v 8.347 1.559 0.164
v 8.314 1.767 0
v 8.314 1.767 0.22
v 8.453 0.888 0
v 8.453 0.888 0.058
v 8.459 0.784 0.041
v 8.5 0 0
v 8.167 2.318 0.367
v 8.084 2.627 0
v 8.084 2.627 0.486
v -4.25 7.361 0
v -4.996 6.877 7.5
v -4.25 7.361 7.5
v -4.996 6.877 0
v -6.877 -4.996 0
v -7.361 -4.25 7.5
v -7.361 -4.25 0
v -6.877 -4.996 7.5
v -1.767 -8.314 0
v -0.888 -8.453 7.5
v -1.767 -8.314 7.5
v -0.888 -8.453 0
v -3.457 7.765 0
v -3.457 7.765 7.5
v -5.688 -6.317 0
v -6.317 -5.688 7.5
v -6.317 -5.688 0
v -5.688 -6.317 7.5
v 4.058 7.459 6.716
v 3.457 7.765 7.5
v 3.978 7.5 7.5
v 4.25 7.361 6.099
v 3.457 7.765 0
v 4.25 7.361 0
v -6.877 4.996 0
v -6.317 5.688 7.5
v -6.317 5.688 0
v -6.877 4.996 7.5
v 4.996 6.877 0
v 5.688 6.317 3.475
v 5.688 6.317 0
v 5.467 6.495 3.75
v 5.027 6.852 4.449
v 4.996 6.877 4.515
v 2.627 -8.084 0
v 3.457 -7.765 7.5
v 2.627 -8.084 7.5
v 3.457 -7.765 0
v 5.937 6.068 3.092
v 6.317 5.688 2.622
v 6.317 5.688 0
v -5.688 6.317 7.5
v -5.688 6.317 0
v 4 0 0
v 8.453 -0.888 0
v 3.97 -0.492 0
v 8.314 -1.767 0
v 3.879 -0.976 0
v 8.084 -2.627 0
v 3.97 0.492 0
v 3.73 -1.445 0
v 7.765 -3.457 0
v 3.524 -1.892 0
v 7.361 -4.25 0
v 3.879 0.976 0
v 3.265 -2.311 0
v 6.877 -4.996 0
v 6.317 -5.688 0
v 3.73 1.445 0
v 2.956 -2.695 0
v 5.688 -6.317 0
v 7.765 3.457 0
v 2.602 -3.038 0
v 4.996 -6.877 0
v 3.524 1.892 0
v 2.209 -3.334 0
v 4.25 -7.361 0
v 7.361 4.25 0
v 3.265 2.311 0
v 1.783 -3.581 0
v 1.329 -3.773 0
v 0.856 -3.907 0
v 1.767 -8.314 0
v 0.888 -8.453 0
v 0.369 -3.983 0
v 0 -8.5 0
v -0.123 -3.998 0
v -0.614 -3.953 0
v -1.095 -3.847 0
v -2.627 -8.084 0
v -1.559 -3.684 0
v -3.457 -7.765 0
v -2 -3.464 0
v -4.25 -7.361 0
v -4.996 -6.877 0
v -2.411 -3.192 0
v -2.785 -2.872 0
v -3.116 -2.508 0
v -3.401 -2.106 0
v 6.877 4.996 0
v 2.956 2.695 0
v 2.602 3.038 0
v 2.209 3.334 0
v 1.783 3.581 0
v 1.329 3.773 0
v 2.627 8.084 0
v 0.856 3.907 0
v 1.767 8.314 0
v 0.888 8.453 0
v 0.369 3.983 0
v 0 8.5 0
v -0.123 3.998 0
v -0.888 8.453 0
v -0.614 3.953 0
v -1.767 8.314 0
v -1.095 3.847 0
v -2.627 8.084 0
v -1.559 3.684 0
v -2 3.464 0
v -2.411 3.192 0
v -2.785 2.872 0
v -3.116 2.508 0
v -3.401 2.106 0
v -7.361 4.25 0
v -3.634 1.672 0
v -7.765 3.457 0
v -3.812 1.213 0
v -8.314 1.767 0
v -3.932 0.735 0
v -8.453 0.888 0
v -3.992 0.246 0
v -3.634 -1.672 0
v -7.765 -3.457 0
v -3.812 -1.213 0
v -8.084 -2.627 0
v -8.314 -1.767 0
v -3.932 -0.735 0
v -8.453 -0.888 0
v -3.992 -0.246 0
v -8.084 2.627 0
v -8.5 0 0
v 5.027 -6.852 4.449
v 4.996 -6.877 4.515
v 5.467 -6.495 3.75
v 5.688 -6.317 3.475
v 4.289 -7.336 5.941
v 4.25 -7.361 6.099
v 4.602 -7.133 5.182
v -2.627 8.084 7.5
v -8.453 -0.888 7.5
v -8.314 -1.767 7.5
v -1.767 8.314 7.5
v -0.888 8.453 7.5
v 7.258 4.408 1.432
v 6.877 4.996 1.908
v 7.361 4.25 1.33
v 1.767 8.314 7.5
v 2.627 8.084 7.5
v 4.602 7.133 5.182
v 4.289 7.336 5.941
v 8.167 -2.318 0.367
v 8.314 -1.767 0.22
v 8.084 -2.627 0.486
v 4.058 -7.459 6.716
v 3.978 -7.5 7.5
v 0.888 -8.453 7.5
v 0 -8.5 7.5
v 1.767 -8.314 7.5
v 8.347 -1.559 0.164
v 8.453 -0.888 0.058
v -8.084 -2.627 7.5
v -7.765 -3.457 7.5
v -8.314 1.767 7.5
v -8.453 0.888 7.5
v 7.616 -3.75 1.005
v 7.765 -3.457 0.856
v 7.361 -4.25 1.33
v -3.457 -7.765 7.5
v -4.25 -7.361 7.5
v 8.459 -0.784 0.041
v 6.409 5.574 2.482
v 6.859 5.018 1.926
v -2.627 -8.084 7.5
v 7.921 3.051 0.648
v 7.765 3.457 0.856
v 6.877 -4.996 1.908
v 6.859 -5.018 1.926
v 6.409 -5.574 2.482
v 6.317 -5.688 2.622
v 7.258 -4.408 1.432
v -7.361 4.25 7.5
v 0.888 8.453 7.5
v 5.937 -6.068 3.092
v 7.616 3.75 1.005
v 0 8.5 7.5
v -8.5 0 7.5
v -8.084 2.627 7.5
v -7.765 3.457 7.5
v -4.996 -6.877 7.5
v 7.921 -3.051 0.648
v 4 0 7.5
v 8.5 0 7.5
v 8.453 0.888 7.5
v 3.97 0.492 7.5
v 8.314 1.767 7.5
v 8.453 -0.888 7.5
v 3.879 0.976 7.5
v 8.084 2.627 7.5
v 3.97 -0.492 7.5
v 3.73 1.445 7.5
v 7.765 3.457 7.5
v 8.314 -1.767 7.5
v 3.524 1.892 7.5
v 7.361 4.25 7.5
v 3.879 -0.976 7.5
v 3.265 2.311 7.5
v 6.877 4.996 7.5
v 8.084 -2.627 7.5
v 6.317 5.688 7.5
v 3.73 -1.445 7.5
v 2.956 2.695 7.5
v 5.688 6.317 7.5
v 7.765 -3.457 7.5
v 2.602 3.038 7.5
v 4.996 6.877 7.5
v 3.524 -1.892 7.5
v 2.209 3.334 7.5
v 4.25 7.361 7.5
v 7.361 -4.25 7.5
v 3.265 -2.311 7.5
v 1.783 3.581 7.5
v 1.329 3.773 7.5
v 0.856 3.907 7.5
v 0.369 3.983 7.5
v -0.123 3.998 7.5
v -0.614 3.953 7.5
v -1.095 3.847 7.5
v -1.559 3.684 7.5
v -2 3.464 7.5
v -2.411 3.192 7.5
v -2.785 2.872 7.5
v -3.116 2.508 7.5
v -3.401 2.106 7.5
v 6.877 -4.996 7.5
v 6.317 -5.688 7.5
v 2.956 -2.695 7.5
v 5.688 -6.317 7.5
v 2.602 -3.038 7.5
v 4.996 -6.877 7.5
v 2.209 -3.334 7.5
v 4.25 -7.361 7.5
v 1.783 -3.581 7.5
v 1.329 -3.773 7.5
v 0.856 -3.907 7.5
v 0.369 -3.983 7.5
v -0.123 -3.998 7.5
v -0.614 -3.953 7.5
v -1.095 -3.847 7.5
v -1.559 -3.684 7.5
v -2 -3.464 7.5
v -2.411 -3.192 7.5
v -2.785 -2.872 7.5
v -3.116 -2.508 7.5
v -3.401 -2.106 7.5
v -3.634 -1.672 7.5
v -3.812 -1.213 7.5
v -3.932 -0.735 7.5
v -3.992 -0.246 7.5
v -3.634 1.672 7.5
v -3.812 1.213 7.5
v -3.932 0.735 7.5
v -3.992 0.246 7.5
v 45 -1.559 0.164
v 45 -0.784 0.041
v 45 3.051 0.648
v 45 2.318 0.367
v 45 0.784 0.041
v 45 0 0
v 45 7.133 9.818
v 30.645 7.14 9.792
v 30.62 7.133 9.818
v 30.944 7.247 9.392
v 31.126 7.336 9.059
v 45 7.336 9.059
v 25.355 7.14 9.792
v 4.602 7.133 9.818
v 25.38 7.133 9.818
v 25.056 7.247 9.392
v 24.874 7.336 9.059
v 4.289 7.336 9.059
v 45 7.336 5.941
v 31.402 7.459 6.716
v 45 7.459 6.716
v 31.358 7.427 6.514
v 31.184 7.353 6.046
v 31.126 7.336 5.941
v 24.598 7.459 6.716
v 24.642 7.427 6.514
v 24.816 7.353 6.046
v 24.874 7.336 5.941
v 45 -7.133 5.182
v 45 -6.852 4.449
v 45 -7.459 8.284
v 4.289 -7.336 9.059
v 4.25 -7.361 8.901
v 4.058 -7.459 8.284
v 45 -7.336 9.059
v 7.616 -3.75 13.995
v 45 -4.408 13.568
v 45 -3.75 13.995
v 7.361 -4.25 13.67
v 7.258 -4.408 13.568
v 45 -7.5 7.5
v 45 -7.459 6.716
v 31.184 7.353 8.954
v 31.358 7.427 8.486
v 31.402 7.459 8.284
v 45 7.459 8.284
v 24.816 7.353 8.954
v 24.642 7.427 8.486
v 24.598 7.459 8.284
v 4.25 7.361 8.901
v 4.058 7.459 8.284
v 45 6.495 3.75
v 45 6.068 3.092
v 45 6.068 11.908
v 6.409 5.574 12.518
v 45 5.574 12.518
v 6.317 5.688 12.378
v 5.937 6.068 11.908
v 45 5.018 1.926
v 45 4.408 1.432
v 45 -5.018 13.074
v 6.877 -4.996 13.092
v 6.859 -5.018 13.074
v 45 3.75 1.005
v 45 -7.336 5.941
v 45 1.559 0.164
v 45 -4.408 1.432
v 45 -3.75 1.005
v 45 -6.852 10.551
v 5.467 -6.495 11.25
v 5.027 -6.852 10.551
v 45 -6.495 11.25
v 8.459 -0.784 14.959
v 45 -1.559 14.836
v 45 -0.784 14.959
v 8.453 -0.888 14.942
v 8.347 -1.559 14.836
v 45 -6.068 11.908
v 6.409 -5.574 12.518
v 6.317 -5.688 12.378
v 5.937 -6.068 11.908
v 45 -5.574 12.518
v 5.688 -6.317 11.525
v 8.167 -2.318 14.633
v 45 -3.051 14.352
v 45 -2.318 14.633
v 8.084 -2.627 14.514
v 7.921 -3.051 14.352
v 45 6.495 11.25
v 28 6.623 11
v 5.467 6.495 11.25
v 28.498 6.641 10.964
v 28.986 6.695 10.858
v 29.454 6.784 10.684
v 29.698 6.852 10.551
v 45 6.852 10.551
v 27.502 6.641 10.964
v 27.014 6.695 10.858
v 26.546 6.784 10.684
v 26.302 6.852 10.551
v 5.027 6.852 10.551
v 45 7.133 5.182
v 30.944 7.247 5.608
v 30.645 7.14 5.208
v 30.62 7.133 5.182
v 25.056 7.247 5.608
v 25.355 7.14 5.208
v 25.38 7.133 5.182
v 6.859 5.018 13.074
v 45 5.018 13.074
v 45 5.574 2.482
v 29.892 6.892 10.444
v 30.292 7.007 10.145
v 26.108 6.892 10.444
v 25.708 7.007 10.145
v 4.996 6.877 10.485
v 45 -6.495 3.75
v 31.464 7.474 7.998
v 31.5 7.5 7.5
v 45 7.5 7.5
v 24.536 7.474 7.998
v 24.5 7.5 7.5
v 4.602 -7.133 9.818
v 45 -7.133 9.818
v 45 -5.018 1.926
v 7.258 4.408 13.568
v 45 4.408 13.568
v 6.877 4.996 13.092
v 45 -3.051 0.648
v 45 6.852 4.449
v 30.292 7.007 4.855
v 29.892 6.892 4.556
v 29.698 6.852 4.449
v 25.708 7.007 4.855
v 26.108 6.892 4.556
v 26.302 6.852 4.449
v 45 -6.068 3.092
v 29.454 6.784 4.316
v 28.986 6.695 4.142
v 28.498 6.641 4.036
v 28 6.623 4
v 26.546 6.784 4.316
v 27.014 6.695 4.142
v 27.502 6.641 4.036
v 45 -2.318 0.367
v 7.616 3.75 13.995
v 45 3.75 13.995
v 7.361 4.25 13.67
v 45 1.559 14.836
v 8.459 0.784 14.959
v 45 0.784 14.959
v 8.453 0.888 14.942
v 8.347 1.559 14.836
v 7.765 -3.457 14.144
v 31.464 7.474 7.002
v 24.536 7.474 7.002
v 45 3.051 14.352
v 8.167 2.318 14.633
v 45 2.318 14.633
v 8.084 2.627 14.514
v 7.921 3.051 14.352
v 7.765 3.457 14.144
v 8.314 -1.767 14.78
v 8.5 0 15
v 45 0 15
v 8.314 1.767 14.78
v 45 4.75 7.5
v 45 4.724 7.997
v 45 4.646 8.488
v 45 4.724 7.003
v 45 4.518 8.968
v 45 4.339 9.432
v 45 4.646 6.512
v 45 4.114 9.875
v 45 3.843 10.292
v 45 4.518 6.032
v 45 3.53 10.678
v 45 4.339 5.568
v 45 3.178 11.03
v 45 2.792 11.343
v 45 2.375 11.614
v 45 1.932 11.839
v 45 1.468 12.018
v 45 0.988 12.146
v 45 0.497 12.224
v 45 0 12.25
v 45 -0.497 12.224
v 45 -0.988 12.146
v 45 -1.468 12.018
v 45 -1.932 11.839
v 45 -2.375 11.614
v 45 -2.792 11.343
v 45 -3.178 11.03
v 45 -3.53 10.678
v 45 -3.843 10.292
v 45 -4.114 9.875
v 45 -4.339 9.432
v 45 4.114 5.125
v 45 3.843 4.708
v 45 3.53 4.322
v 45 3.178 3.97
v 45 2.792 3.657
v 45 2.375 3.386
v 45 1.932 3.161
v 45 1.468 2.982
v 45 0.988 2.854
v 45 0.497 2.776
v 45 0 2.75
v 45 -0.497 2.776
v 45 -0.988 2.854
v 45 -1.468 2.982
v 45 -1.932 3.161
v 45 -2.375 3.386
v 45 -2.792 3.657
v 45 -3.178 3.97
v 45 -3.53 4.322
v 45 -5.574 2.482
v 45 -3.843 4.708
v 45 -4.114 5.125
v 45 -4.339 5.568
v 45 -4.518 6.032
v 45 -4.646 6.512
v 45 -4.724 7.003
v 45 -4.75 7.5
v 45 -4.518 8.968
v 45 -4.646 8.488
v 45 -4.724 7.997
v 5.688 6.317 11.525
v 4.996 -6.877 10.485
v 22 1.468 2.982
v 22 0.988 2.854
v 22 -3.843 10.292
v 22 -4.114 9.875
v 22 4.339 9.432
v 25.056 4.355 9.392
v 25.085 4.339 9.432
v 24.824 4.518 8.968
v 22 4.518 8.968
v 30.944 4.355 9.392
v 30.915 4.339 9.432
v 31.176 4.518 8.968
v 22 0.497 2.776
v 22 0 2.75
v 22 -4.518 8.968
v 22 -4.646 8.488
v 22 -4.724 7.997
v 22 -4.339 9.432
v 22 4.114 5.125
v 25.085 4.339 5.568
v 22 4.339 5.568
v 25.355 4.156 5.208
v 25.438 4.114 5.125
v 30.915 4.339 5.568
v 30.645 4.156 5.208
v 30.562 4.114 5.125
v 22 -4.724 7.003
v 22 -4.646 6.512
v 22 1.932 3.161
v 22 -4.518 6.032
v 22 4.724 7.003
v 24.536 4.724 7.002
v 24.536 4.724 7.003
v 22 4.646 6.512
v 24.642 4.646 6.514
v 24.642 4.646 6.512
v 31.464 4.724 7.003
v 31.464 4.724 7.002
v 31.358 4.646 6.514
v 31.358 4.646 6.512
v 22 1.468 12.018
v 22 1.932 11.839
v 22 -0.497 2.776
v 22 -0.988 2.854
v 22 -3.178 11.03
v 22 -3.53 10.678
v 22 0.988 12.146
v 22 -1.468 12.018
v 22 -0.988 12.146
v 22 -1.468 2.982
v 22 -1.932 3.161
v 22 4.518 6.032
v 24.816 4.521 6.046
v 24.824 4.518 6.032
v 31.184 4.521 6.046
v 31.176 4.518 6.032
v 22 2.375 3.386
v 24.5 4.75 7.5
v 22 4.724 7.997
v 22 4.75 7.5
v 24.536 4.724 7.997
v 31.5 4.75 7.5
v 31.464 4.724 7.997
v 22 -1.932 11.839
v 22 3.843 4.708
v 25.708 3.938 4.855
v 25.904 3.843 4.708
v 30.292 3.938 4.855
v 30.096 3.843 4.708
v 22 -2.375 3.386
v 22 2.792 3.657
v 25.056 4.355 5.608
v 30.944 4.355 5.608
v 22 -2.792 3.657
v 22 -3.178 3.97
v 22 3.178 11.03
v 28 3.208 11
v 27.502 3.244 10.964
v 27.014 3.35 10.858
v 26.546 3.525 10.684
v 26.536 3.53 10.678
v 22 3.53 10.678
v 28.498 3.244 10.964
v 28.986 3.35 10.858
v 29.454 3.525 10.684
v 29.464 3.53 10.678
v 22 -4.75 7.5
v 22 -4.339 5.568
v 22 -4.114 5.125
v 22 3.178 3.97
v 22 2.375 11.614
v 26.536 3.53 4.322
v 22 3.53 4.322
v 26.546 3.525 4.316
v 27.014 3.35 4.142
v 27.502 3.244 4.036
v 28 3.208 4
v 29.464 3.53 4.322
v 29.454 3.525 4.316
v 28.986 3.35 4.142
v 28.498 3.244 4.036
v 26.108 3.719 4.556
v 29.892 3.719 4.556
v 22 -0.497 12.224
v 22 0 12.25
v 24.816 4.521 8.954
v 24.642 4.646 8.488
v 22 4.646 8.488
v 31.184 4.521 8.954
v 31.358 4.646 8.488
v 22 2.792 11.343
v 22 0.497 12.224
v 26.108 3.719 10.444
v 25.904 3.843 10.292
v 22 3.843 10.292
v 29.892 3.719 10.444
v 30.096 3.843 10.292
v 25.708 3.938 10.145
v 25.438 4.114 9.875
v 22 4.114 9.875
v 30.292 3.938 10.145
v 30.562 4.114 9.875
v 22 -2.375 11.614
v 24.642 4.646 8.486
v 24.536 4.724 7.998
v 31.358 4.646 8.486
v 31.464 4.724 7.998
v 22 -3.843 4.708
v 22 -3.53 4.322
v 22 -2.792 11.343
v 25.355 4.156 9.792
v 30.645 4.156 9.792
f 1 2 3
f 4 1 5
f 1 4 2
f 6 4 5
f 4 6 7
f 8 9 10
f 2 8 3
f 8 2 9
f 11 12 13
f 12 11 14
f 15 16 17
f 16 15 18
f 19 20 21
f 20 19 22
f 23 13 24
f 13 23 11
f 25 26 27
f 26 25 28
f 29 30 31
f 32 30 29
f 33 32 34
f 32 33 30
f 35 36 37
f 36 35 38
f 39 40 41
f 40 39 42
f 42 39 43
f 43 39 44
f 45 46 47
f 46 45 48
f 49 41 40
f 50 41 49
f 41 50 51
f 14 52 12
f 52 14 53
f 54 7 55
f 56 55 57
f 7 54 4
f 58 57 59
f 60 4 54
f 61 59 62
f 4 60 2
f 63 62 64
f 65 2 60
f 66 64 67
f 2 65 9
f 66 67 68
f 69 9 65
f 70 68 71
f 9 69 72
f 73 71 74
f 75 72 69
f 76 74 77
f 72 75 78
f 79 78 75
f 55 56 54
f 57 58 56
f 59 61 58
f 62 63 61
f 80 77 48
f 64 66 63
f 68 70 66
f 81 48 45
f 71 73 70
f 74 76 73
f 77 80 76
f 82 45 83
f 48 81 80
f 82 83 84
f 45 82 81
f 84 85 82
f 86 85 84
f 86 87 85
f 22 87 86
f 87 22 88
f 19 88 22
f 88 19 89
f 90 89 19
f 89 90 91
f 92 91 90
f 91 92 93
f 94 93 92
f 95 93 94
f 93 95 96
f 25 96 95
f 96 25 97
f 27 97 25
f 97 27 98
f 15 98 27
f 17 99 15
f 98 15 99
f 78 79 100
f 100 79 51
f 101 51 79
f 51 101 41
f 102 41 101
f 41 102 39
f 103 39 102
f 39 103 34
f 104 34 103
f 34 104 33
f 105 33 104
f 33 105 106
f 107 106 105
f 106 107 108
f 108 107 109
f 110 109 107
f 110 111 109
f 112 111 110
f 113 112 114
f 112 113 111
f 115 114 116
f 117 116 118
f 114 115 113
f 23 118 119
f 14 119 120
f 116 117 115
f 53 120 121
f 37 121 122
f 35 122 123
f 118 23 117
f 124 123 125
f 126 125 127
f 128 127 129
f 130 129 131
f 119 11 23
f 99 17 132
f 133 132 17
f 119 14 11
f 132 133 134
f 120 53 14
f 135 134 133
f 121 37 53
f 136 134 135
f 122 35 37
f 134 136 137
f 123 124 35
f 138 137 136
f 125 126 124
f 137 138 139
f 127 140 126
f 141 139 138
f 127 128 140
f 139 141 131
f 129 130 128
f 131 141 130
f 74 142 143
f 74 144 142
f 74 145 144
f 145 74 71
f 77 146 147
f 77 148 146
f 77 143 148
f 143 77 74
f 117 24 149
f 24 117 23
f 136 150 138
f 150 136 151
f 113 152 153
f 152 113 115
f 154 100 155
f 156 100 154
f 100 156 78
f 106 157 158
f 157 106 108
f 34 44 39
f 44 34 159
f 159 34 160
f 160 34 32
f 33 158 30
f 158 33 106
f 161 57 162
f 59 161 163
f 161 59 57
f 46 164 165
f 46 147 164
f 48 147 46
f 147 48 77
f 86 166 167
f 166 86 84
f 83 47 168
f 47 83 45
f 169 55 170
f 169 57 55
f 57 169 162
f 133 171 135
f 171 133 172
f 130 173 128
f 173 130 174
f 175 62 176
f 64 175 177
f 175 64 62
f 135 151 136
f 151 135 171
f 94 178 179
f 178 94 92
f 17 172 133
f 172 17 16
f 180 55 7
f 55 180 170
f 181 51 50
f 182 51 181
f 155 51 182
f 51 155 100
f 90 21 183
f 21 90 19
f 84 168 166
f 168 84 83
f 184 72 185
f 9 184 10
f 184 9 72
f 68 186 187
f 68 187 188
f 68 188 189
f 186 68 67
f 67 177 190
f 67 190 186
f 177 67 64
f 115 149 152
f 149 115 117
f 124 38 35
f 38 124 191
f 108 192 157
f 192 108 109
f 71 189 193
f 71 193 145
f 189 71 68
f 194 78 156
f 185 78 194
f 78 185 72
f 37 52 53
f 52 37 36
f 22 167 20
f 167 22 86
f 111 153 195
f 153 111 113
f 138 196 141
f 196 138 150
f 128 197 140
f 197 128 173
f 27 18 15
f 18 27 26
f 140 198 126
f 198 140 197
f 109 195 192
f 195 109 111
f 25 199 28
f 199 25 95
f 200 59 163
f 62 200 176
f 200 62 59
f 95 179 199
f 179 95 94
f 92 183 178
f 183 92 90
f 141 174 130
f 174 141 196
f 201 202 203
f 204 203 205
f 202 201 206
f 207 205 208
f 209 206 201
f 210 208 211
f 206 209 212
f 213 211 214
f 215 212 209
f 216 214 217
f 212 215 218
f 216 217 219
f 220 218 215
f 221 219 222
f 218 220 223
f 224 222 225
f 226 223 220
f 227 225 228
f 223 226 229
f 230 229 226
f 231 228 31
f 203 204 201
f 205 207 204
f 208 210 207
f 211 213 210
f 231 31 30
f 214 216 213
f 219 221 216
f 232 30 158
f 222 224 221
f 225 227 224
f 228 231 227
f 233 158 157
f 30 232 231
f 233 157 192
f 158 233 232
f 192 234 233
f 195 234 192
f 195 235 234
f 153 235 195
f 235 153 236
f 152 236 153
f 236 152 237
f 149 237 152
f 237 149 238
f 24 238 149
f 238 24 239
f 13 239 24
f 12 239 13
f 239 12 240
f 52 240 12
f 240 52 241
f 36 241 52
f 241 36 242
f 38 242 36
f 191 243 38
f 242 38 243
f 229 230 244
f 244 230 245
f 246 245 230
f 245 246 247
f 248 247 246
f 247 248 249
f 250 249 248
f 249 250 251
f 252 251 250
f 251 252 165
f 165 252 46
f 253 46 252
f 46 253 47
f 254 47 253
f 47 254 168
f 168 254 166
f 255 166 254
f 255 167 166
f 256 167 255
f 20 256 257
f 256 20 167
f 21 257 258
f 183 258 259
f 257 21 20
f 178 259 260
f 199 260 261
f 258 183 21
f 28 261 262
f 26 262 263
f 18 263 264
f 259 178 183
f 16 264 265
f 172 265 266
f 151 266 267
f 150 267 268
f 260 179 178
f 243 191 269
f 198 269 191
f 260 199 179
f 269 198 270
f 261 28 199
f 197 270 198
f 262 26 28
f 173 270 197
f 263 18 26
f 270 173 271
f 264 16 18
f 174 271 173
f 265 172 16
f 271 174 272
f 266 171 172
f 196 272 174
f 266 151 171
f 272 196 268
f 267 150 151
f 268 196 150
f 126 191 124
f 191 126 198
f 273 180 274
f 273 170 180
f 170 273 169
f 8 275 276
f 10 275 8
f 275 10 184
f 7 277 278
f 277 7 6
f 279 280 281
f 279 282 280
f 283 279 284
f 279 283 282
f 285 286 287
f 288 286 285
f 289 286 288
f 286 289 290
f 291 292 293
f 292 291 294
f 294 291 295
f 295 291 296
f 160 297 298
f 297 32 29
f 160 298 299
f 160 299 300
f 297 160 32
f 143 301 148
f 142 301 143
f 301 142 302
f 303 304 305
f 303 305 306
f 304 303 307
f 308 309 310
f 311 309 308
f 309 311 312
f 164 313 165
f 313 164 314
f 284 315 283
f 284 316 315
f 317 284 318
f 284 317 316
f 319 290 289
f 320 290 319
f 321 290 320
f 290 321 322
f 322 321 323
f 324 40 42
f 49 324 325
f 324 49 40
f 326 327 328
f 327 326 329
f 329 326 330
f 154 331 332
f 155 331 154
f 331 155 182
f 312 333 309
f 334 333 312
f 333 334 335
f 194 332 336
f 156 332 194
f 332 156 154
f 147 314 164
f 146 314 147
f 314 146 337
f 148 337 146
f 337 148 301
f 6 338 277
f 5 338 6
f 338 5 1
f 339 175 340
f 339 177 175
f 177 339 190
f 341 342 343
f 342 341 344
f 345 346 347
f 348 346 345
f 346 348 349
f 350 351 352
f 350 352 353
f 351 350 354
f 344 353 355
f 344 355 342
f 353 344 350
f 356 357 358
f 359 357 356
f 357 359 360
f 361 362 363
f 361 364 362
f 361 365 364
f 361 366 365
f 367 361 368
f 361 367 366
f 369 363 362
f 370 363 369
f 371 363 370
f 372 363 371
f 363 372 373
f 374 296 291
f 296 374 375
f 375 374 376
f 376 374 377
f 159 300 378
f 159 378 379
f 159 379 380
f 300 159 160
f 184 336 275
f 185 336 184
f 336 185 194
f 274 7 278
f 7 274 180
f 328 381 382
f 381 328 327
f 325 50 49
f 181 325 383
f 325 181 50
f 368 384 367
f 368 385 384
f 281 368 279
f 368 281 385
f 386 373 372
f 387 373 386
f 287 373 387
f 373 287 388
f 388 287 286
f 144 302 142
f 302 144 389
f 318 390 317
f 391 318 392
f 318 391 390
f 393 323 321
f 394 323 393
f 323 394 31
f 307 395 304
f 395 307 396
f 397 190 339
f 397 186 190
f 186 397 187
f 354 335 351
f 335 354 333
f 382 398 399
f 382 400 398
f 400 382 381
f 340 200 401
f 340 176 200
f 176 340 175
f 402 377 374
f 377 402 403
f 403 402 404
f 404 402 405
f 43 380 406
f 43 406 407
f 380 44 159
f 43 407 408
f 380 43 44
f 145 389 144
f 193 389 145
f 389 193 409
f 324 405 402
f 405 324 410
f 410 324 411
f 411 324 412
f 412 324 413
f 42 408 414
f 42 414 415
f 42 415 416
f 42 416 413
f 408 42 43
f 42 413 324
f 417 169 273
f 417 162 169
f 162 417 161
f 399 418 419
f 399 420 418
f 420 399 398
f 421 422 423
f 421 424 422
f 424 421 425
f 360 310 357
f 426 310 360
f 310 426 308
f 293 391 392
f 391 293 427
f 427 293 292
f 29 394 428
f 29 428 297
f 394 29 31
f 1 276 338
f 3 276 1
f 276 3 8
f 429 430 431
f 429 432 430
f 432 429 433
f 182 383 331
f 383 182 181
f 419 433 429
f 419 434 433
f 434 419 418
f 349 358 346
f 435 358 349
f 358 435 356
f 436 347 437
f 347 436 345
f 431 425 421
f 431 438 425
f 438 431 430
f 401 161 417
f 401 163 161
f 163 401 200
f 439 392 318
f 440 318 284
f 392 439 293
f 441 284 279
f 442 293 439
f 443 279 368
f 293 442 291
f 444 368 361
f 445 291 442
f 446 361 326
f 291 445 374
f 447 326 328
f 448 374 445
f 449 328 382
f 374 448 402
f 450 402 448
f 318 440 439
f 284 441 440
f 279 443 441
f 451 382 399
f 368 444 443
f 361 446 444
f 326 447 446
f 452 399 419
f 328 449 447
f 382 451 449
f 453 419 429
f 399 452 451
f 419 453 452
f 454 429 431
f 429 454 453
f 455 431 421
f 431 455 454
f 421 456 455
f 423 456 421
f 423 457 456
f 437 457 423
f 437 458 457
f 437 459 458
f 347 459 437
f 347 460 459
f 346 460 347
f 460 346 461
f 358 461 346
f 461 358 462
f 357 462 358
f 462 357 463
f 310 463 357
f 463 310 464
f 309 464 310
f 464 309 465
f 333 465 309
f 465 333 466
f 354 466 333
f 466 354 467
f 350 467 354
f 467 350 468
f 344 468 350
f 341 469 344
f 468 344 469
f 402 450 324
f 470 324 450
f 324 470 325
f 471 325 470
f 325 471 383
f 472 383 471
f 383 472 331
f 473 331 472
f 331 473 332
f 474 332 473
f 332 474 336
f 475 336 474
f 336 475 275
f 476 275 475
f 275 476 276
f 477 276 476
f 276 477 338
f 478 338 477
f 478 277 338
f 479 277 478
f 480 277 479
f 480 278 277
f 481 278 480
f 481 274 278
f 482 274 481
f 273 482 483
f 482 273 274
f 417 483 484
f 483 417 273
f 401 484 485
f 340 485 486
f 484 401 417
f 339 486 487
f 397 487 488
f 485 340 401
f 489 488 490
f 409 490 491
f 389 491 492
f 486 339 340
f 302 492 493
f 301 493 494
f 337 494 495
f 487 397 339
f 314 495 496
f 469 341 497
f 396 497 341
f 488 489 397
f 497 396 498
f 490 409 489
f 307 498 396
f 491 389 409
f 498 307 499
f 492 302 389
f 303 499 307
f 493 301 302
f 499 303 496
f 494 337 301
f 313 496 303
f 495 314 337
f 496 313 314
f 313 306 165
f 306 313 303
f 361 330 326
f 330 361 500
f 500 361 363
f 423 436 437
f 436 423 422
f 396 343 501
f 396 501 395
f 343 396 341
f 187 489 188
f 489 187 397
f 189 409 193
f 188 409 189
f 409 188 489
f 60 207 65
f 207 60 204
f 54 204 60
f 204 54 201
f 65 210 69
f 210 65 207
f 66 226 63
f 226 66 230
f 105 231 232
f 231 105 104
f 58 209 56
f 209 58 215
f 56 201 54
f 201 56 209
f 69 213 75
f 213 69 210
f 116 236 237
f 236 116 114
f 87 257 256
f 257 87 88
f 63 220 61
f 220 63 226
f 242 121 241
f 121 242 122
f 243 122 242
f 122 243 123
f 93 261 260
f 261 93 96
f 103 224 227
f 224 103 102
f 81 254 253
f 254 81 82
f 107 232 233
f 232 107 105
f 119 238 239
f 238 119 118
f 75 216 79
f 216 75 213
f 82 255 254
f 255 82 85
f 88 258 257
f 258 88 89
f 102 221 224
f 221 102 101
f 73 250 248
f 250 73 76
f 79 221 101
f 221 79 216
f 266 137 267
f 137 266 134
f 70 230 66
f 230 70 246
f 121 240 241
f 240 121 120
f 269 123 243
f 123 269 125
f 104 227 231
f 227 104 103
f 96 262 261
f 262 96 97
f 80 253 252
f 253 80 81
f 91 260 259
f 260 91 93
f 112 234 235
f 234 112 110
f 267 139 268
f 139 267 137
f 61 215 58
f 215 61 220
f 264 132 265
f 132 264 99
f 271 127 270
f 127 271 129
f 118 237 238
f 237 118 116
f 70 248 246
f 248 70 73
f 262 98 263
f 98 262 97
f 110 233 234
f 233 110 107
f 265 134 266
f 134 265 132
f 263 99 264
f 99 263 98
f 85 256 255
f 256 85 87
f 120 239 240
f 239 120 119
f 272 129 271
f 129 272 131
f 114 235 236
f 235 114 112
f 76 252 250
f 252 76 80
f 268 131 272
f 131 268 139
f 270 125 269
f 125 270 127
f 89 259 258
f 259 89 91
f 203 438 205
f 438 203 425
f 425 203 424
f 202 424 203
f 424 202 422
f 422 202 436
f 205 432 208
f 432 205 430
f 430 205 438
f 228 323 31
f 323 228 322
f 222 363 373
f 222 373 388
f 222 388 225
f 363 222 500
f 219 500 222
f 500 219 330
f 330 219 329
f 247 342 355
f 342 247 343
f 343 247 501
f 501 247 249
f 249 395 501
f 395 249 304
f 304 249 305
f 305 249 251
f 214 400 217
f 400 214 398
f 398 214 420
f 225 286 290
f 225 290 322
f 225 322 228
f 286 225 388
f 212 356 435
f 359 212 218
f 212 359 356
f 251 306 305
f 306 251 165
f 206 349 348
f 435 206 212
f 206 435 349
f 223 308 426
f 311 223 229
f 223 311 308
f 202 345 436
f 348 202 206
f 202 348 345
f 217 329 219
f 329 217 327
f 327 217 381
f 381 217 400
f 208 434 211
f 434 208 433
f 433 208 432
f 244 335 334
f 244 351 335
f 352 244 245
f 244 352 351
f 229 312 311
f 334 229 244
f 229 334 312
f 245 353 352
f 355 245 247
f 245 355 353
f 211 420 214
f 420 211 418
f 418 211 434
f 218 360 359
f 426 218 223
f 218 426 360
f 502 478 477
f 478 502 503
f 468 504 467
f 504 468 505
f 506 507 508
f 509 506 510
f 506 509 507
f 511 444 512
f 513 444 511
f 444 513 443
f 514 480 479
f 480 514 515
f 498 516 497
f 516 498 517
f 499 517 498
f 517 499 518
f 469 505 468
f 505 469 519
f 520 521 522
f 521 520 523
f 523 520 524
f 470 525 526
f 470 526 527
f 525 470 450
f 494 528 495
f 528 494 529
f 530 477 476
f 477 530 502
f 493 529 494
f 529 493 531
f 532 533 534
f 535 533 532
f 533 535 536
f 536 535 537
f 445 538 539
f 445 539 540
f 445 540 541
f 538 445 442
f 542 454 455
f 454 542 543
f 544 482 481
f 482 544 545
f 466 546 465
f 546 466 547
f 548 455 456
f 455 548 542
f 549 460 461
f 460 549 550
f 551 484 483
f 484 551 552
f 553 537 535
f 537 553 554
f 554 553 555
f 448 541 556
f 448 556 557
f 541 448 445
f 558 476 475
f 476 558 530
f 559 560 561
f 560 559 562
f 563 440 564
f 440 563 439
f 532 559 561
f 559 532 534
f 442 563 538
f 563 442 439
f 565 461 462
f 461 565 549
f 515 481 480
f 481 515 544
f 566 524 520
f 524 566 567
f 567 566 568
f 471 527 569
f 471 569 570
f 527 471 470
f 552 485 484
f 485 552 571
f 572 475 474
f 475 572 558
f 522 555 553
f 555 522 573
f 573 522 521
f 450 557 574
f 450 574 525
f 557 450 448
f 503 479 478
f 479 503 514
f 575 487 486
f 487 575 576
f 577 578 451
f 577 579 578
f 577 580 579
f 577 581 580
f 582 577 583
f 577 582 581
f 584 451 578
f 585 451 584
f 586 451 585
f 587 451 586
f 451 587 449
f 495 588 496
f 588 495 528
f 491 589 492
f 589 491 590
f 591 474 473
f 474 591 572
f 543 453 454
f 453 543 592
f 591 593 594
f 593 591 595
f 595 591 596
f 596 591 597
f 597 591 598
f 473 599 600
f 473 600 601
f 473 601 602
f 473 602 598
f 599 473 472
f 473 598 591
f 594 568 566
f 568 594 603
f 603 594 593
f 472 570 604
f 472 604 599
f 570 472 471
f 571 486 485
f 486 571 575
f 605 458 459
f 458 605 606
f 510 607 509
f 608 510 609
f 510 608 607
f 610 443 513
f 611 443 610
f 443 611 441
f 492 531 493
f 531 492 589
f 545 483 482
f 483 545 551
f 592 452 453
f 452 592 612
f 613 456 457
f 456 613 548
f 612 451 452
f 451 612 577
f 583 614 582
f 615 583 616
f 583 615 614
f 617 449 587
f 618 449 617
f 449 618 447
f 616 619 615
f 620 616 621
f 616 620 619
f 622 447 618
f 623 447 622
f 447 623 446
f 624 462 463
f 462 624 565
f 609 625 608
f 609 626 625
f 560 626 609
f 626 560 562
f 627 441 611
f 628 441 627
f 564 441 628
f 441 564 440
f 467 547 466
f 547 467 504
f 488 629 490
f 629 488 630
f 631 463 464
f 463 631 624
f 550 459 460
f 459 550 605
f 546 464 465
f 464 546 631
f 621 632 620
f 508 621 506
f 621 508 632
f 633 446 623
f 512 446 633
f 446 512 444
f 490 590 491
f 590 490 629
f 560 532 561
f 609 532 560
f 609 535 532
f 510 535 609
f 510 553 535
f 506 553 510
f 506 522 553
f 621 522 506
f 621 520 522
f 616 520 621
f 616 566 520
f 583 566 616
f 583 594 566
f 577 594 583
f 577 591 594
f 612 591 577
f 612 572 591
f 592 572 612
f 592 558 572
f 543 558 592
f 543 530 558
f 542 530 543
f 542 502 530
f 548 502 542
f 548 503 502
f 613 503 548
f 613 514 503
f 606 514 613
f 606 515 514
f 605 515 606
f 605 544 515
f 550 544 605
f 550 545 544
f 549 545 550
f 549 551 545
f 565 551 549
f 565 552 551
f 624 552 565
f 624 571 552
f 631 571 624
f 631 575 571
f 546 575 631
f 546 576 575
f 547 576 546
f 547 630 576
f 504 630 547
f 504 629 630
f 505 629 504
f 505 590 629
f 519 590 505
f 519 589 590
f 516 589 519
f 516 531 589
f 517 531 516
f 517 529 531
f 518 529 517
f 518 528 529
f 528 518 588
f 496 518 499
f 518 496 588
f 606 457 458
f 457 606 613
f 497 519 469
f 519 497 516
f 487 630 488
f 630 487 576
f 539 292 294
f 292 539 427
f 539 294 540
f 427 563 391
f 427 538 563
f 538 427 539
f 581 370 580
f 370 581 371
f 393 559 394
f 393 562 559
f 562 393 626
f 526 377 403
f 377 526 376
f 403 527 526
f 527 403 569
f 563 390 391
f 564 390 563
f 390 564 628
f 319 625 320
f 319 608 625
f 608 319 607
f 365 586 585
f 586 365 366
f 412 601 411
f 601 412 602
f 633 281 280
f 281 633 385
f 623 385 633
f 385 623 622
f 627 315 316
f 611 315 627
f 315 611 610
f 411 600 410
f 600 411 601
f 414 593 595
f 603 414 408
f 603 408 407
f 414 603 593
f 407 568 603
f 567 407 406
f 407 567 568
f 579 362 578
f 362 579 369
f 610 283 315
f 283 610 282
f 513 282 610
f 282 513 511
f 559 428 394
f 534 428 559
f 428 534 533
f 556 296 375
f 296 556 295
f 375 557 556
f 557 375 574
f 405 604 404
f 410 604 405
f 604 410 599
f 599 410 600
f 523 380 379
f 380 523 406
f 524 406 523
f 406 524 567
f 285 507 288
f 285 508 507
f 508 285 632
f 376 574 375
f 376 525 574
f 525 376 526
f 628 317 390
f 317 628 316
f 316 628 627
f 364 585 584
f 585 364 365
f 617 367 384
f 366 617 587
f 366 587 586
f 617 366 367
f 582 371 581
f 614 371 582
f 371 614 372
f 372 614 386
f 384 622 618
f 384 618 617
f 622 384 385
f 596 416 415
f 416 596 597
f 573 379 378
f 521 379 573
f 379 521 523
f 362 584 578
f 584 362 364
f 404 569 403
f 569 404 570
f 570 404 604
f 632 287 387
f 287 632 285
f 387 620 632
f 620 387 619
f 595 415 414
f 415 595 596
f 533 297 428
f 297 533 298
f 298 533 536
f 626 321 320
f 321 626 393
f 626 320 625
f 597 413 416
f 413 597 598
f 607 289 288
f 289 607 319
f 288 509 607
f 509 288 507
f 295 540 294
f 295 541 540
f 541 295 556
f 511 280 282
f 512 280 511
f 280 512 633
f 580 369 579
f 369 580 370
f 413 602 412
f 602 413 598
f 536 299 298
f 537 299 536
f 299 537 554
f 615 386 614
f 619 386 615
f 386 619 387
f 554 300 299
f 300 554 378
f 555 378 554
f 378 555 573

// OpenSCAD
e = 0.001;
module lamppart
    (d1 = 17, h1 = 7.5, di = 8, l = 45, t = 21, d2 = 9.5, lh = 28, d3 = 7)
{
    difference () {
        union () {
            cylinder (r = d1 / 2, h = h1);
            translate ([0, 0, h1])
                rotate ([0, 90, 0])
                    cylinder (r = h1, h = l);
        }
        cylinder (r = di / 2, h = h1 * 3, center = true);
        translate ([0, 0, h1])
            cylinder (r = d1 / 2, h = h1);
        translate ([t + 1, 0, h1])
            rotate ([0, 90, 0])
                cylinder (r = d2 / 2, h = l - t);
        translate ([lh, 0, h1])
            rotate ([-90, 0, 0])
                cylinder (r = d3 / 2, h = 2 * h1);
    }
}

lamppart ($fa = 6, $fs = .5);
